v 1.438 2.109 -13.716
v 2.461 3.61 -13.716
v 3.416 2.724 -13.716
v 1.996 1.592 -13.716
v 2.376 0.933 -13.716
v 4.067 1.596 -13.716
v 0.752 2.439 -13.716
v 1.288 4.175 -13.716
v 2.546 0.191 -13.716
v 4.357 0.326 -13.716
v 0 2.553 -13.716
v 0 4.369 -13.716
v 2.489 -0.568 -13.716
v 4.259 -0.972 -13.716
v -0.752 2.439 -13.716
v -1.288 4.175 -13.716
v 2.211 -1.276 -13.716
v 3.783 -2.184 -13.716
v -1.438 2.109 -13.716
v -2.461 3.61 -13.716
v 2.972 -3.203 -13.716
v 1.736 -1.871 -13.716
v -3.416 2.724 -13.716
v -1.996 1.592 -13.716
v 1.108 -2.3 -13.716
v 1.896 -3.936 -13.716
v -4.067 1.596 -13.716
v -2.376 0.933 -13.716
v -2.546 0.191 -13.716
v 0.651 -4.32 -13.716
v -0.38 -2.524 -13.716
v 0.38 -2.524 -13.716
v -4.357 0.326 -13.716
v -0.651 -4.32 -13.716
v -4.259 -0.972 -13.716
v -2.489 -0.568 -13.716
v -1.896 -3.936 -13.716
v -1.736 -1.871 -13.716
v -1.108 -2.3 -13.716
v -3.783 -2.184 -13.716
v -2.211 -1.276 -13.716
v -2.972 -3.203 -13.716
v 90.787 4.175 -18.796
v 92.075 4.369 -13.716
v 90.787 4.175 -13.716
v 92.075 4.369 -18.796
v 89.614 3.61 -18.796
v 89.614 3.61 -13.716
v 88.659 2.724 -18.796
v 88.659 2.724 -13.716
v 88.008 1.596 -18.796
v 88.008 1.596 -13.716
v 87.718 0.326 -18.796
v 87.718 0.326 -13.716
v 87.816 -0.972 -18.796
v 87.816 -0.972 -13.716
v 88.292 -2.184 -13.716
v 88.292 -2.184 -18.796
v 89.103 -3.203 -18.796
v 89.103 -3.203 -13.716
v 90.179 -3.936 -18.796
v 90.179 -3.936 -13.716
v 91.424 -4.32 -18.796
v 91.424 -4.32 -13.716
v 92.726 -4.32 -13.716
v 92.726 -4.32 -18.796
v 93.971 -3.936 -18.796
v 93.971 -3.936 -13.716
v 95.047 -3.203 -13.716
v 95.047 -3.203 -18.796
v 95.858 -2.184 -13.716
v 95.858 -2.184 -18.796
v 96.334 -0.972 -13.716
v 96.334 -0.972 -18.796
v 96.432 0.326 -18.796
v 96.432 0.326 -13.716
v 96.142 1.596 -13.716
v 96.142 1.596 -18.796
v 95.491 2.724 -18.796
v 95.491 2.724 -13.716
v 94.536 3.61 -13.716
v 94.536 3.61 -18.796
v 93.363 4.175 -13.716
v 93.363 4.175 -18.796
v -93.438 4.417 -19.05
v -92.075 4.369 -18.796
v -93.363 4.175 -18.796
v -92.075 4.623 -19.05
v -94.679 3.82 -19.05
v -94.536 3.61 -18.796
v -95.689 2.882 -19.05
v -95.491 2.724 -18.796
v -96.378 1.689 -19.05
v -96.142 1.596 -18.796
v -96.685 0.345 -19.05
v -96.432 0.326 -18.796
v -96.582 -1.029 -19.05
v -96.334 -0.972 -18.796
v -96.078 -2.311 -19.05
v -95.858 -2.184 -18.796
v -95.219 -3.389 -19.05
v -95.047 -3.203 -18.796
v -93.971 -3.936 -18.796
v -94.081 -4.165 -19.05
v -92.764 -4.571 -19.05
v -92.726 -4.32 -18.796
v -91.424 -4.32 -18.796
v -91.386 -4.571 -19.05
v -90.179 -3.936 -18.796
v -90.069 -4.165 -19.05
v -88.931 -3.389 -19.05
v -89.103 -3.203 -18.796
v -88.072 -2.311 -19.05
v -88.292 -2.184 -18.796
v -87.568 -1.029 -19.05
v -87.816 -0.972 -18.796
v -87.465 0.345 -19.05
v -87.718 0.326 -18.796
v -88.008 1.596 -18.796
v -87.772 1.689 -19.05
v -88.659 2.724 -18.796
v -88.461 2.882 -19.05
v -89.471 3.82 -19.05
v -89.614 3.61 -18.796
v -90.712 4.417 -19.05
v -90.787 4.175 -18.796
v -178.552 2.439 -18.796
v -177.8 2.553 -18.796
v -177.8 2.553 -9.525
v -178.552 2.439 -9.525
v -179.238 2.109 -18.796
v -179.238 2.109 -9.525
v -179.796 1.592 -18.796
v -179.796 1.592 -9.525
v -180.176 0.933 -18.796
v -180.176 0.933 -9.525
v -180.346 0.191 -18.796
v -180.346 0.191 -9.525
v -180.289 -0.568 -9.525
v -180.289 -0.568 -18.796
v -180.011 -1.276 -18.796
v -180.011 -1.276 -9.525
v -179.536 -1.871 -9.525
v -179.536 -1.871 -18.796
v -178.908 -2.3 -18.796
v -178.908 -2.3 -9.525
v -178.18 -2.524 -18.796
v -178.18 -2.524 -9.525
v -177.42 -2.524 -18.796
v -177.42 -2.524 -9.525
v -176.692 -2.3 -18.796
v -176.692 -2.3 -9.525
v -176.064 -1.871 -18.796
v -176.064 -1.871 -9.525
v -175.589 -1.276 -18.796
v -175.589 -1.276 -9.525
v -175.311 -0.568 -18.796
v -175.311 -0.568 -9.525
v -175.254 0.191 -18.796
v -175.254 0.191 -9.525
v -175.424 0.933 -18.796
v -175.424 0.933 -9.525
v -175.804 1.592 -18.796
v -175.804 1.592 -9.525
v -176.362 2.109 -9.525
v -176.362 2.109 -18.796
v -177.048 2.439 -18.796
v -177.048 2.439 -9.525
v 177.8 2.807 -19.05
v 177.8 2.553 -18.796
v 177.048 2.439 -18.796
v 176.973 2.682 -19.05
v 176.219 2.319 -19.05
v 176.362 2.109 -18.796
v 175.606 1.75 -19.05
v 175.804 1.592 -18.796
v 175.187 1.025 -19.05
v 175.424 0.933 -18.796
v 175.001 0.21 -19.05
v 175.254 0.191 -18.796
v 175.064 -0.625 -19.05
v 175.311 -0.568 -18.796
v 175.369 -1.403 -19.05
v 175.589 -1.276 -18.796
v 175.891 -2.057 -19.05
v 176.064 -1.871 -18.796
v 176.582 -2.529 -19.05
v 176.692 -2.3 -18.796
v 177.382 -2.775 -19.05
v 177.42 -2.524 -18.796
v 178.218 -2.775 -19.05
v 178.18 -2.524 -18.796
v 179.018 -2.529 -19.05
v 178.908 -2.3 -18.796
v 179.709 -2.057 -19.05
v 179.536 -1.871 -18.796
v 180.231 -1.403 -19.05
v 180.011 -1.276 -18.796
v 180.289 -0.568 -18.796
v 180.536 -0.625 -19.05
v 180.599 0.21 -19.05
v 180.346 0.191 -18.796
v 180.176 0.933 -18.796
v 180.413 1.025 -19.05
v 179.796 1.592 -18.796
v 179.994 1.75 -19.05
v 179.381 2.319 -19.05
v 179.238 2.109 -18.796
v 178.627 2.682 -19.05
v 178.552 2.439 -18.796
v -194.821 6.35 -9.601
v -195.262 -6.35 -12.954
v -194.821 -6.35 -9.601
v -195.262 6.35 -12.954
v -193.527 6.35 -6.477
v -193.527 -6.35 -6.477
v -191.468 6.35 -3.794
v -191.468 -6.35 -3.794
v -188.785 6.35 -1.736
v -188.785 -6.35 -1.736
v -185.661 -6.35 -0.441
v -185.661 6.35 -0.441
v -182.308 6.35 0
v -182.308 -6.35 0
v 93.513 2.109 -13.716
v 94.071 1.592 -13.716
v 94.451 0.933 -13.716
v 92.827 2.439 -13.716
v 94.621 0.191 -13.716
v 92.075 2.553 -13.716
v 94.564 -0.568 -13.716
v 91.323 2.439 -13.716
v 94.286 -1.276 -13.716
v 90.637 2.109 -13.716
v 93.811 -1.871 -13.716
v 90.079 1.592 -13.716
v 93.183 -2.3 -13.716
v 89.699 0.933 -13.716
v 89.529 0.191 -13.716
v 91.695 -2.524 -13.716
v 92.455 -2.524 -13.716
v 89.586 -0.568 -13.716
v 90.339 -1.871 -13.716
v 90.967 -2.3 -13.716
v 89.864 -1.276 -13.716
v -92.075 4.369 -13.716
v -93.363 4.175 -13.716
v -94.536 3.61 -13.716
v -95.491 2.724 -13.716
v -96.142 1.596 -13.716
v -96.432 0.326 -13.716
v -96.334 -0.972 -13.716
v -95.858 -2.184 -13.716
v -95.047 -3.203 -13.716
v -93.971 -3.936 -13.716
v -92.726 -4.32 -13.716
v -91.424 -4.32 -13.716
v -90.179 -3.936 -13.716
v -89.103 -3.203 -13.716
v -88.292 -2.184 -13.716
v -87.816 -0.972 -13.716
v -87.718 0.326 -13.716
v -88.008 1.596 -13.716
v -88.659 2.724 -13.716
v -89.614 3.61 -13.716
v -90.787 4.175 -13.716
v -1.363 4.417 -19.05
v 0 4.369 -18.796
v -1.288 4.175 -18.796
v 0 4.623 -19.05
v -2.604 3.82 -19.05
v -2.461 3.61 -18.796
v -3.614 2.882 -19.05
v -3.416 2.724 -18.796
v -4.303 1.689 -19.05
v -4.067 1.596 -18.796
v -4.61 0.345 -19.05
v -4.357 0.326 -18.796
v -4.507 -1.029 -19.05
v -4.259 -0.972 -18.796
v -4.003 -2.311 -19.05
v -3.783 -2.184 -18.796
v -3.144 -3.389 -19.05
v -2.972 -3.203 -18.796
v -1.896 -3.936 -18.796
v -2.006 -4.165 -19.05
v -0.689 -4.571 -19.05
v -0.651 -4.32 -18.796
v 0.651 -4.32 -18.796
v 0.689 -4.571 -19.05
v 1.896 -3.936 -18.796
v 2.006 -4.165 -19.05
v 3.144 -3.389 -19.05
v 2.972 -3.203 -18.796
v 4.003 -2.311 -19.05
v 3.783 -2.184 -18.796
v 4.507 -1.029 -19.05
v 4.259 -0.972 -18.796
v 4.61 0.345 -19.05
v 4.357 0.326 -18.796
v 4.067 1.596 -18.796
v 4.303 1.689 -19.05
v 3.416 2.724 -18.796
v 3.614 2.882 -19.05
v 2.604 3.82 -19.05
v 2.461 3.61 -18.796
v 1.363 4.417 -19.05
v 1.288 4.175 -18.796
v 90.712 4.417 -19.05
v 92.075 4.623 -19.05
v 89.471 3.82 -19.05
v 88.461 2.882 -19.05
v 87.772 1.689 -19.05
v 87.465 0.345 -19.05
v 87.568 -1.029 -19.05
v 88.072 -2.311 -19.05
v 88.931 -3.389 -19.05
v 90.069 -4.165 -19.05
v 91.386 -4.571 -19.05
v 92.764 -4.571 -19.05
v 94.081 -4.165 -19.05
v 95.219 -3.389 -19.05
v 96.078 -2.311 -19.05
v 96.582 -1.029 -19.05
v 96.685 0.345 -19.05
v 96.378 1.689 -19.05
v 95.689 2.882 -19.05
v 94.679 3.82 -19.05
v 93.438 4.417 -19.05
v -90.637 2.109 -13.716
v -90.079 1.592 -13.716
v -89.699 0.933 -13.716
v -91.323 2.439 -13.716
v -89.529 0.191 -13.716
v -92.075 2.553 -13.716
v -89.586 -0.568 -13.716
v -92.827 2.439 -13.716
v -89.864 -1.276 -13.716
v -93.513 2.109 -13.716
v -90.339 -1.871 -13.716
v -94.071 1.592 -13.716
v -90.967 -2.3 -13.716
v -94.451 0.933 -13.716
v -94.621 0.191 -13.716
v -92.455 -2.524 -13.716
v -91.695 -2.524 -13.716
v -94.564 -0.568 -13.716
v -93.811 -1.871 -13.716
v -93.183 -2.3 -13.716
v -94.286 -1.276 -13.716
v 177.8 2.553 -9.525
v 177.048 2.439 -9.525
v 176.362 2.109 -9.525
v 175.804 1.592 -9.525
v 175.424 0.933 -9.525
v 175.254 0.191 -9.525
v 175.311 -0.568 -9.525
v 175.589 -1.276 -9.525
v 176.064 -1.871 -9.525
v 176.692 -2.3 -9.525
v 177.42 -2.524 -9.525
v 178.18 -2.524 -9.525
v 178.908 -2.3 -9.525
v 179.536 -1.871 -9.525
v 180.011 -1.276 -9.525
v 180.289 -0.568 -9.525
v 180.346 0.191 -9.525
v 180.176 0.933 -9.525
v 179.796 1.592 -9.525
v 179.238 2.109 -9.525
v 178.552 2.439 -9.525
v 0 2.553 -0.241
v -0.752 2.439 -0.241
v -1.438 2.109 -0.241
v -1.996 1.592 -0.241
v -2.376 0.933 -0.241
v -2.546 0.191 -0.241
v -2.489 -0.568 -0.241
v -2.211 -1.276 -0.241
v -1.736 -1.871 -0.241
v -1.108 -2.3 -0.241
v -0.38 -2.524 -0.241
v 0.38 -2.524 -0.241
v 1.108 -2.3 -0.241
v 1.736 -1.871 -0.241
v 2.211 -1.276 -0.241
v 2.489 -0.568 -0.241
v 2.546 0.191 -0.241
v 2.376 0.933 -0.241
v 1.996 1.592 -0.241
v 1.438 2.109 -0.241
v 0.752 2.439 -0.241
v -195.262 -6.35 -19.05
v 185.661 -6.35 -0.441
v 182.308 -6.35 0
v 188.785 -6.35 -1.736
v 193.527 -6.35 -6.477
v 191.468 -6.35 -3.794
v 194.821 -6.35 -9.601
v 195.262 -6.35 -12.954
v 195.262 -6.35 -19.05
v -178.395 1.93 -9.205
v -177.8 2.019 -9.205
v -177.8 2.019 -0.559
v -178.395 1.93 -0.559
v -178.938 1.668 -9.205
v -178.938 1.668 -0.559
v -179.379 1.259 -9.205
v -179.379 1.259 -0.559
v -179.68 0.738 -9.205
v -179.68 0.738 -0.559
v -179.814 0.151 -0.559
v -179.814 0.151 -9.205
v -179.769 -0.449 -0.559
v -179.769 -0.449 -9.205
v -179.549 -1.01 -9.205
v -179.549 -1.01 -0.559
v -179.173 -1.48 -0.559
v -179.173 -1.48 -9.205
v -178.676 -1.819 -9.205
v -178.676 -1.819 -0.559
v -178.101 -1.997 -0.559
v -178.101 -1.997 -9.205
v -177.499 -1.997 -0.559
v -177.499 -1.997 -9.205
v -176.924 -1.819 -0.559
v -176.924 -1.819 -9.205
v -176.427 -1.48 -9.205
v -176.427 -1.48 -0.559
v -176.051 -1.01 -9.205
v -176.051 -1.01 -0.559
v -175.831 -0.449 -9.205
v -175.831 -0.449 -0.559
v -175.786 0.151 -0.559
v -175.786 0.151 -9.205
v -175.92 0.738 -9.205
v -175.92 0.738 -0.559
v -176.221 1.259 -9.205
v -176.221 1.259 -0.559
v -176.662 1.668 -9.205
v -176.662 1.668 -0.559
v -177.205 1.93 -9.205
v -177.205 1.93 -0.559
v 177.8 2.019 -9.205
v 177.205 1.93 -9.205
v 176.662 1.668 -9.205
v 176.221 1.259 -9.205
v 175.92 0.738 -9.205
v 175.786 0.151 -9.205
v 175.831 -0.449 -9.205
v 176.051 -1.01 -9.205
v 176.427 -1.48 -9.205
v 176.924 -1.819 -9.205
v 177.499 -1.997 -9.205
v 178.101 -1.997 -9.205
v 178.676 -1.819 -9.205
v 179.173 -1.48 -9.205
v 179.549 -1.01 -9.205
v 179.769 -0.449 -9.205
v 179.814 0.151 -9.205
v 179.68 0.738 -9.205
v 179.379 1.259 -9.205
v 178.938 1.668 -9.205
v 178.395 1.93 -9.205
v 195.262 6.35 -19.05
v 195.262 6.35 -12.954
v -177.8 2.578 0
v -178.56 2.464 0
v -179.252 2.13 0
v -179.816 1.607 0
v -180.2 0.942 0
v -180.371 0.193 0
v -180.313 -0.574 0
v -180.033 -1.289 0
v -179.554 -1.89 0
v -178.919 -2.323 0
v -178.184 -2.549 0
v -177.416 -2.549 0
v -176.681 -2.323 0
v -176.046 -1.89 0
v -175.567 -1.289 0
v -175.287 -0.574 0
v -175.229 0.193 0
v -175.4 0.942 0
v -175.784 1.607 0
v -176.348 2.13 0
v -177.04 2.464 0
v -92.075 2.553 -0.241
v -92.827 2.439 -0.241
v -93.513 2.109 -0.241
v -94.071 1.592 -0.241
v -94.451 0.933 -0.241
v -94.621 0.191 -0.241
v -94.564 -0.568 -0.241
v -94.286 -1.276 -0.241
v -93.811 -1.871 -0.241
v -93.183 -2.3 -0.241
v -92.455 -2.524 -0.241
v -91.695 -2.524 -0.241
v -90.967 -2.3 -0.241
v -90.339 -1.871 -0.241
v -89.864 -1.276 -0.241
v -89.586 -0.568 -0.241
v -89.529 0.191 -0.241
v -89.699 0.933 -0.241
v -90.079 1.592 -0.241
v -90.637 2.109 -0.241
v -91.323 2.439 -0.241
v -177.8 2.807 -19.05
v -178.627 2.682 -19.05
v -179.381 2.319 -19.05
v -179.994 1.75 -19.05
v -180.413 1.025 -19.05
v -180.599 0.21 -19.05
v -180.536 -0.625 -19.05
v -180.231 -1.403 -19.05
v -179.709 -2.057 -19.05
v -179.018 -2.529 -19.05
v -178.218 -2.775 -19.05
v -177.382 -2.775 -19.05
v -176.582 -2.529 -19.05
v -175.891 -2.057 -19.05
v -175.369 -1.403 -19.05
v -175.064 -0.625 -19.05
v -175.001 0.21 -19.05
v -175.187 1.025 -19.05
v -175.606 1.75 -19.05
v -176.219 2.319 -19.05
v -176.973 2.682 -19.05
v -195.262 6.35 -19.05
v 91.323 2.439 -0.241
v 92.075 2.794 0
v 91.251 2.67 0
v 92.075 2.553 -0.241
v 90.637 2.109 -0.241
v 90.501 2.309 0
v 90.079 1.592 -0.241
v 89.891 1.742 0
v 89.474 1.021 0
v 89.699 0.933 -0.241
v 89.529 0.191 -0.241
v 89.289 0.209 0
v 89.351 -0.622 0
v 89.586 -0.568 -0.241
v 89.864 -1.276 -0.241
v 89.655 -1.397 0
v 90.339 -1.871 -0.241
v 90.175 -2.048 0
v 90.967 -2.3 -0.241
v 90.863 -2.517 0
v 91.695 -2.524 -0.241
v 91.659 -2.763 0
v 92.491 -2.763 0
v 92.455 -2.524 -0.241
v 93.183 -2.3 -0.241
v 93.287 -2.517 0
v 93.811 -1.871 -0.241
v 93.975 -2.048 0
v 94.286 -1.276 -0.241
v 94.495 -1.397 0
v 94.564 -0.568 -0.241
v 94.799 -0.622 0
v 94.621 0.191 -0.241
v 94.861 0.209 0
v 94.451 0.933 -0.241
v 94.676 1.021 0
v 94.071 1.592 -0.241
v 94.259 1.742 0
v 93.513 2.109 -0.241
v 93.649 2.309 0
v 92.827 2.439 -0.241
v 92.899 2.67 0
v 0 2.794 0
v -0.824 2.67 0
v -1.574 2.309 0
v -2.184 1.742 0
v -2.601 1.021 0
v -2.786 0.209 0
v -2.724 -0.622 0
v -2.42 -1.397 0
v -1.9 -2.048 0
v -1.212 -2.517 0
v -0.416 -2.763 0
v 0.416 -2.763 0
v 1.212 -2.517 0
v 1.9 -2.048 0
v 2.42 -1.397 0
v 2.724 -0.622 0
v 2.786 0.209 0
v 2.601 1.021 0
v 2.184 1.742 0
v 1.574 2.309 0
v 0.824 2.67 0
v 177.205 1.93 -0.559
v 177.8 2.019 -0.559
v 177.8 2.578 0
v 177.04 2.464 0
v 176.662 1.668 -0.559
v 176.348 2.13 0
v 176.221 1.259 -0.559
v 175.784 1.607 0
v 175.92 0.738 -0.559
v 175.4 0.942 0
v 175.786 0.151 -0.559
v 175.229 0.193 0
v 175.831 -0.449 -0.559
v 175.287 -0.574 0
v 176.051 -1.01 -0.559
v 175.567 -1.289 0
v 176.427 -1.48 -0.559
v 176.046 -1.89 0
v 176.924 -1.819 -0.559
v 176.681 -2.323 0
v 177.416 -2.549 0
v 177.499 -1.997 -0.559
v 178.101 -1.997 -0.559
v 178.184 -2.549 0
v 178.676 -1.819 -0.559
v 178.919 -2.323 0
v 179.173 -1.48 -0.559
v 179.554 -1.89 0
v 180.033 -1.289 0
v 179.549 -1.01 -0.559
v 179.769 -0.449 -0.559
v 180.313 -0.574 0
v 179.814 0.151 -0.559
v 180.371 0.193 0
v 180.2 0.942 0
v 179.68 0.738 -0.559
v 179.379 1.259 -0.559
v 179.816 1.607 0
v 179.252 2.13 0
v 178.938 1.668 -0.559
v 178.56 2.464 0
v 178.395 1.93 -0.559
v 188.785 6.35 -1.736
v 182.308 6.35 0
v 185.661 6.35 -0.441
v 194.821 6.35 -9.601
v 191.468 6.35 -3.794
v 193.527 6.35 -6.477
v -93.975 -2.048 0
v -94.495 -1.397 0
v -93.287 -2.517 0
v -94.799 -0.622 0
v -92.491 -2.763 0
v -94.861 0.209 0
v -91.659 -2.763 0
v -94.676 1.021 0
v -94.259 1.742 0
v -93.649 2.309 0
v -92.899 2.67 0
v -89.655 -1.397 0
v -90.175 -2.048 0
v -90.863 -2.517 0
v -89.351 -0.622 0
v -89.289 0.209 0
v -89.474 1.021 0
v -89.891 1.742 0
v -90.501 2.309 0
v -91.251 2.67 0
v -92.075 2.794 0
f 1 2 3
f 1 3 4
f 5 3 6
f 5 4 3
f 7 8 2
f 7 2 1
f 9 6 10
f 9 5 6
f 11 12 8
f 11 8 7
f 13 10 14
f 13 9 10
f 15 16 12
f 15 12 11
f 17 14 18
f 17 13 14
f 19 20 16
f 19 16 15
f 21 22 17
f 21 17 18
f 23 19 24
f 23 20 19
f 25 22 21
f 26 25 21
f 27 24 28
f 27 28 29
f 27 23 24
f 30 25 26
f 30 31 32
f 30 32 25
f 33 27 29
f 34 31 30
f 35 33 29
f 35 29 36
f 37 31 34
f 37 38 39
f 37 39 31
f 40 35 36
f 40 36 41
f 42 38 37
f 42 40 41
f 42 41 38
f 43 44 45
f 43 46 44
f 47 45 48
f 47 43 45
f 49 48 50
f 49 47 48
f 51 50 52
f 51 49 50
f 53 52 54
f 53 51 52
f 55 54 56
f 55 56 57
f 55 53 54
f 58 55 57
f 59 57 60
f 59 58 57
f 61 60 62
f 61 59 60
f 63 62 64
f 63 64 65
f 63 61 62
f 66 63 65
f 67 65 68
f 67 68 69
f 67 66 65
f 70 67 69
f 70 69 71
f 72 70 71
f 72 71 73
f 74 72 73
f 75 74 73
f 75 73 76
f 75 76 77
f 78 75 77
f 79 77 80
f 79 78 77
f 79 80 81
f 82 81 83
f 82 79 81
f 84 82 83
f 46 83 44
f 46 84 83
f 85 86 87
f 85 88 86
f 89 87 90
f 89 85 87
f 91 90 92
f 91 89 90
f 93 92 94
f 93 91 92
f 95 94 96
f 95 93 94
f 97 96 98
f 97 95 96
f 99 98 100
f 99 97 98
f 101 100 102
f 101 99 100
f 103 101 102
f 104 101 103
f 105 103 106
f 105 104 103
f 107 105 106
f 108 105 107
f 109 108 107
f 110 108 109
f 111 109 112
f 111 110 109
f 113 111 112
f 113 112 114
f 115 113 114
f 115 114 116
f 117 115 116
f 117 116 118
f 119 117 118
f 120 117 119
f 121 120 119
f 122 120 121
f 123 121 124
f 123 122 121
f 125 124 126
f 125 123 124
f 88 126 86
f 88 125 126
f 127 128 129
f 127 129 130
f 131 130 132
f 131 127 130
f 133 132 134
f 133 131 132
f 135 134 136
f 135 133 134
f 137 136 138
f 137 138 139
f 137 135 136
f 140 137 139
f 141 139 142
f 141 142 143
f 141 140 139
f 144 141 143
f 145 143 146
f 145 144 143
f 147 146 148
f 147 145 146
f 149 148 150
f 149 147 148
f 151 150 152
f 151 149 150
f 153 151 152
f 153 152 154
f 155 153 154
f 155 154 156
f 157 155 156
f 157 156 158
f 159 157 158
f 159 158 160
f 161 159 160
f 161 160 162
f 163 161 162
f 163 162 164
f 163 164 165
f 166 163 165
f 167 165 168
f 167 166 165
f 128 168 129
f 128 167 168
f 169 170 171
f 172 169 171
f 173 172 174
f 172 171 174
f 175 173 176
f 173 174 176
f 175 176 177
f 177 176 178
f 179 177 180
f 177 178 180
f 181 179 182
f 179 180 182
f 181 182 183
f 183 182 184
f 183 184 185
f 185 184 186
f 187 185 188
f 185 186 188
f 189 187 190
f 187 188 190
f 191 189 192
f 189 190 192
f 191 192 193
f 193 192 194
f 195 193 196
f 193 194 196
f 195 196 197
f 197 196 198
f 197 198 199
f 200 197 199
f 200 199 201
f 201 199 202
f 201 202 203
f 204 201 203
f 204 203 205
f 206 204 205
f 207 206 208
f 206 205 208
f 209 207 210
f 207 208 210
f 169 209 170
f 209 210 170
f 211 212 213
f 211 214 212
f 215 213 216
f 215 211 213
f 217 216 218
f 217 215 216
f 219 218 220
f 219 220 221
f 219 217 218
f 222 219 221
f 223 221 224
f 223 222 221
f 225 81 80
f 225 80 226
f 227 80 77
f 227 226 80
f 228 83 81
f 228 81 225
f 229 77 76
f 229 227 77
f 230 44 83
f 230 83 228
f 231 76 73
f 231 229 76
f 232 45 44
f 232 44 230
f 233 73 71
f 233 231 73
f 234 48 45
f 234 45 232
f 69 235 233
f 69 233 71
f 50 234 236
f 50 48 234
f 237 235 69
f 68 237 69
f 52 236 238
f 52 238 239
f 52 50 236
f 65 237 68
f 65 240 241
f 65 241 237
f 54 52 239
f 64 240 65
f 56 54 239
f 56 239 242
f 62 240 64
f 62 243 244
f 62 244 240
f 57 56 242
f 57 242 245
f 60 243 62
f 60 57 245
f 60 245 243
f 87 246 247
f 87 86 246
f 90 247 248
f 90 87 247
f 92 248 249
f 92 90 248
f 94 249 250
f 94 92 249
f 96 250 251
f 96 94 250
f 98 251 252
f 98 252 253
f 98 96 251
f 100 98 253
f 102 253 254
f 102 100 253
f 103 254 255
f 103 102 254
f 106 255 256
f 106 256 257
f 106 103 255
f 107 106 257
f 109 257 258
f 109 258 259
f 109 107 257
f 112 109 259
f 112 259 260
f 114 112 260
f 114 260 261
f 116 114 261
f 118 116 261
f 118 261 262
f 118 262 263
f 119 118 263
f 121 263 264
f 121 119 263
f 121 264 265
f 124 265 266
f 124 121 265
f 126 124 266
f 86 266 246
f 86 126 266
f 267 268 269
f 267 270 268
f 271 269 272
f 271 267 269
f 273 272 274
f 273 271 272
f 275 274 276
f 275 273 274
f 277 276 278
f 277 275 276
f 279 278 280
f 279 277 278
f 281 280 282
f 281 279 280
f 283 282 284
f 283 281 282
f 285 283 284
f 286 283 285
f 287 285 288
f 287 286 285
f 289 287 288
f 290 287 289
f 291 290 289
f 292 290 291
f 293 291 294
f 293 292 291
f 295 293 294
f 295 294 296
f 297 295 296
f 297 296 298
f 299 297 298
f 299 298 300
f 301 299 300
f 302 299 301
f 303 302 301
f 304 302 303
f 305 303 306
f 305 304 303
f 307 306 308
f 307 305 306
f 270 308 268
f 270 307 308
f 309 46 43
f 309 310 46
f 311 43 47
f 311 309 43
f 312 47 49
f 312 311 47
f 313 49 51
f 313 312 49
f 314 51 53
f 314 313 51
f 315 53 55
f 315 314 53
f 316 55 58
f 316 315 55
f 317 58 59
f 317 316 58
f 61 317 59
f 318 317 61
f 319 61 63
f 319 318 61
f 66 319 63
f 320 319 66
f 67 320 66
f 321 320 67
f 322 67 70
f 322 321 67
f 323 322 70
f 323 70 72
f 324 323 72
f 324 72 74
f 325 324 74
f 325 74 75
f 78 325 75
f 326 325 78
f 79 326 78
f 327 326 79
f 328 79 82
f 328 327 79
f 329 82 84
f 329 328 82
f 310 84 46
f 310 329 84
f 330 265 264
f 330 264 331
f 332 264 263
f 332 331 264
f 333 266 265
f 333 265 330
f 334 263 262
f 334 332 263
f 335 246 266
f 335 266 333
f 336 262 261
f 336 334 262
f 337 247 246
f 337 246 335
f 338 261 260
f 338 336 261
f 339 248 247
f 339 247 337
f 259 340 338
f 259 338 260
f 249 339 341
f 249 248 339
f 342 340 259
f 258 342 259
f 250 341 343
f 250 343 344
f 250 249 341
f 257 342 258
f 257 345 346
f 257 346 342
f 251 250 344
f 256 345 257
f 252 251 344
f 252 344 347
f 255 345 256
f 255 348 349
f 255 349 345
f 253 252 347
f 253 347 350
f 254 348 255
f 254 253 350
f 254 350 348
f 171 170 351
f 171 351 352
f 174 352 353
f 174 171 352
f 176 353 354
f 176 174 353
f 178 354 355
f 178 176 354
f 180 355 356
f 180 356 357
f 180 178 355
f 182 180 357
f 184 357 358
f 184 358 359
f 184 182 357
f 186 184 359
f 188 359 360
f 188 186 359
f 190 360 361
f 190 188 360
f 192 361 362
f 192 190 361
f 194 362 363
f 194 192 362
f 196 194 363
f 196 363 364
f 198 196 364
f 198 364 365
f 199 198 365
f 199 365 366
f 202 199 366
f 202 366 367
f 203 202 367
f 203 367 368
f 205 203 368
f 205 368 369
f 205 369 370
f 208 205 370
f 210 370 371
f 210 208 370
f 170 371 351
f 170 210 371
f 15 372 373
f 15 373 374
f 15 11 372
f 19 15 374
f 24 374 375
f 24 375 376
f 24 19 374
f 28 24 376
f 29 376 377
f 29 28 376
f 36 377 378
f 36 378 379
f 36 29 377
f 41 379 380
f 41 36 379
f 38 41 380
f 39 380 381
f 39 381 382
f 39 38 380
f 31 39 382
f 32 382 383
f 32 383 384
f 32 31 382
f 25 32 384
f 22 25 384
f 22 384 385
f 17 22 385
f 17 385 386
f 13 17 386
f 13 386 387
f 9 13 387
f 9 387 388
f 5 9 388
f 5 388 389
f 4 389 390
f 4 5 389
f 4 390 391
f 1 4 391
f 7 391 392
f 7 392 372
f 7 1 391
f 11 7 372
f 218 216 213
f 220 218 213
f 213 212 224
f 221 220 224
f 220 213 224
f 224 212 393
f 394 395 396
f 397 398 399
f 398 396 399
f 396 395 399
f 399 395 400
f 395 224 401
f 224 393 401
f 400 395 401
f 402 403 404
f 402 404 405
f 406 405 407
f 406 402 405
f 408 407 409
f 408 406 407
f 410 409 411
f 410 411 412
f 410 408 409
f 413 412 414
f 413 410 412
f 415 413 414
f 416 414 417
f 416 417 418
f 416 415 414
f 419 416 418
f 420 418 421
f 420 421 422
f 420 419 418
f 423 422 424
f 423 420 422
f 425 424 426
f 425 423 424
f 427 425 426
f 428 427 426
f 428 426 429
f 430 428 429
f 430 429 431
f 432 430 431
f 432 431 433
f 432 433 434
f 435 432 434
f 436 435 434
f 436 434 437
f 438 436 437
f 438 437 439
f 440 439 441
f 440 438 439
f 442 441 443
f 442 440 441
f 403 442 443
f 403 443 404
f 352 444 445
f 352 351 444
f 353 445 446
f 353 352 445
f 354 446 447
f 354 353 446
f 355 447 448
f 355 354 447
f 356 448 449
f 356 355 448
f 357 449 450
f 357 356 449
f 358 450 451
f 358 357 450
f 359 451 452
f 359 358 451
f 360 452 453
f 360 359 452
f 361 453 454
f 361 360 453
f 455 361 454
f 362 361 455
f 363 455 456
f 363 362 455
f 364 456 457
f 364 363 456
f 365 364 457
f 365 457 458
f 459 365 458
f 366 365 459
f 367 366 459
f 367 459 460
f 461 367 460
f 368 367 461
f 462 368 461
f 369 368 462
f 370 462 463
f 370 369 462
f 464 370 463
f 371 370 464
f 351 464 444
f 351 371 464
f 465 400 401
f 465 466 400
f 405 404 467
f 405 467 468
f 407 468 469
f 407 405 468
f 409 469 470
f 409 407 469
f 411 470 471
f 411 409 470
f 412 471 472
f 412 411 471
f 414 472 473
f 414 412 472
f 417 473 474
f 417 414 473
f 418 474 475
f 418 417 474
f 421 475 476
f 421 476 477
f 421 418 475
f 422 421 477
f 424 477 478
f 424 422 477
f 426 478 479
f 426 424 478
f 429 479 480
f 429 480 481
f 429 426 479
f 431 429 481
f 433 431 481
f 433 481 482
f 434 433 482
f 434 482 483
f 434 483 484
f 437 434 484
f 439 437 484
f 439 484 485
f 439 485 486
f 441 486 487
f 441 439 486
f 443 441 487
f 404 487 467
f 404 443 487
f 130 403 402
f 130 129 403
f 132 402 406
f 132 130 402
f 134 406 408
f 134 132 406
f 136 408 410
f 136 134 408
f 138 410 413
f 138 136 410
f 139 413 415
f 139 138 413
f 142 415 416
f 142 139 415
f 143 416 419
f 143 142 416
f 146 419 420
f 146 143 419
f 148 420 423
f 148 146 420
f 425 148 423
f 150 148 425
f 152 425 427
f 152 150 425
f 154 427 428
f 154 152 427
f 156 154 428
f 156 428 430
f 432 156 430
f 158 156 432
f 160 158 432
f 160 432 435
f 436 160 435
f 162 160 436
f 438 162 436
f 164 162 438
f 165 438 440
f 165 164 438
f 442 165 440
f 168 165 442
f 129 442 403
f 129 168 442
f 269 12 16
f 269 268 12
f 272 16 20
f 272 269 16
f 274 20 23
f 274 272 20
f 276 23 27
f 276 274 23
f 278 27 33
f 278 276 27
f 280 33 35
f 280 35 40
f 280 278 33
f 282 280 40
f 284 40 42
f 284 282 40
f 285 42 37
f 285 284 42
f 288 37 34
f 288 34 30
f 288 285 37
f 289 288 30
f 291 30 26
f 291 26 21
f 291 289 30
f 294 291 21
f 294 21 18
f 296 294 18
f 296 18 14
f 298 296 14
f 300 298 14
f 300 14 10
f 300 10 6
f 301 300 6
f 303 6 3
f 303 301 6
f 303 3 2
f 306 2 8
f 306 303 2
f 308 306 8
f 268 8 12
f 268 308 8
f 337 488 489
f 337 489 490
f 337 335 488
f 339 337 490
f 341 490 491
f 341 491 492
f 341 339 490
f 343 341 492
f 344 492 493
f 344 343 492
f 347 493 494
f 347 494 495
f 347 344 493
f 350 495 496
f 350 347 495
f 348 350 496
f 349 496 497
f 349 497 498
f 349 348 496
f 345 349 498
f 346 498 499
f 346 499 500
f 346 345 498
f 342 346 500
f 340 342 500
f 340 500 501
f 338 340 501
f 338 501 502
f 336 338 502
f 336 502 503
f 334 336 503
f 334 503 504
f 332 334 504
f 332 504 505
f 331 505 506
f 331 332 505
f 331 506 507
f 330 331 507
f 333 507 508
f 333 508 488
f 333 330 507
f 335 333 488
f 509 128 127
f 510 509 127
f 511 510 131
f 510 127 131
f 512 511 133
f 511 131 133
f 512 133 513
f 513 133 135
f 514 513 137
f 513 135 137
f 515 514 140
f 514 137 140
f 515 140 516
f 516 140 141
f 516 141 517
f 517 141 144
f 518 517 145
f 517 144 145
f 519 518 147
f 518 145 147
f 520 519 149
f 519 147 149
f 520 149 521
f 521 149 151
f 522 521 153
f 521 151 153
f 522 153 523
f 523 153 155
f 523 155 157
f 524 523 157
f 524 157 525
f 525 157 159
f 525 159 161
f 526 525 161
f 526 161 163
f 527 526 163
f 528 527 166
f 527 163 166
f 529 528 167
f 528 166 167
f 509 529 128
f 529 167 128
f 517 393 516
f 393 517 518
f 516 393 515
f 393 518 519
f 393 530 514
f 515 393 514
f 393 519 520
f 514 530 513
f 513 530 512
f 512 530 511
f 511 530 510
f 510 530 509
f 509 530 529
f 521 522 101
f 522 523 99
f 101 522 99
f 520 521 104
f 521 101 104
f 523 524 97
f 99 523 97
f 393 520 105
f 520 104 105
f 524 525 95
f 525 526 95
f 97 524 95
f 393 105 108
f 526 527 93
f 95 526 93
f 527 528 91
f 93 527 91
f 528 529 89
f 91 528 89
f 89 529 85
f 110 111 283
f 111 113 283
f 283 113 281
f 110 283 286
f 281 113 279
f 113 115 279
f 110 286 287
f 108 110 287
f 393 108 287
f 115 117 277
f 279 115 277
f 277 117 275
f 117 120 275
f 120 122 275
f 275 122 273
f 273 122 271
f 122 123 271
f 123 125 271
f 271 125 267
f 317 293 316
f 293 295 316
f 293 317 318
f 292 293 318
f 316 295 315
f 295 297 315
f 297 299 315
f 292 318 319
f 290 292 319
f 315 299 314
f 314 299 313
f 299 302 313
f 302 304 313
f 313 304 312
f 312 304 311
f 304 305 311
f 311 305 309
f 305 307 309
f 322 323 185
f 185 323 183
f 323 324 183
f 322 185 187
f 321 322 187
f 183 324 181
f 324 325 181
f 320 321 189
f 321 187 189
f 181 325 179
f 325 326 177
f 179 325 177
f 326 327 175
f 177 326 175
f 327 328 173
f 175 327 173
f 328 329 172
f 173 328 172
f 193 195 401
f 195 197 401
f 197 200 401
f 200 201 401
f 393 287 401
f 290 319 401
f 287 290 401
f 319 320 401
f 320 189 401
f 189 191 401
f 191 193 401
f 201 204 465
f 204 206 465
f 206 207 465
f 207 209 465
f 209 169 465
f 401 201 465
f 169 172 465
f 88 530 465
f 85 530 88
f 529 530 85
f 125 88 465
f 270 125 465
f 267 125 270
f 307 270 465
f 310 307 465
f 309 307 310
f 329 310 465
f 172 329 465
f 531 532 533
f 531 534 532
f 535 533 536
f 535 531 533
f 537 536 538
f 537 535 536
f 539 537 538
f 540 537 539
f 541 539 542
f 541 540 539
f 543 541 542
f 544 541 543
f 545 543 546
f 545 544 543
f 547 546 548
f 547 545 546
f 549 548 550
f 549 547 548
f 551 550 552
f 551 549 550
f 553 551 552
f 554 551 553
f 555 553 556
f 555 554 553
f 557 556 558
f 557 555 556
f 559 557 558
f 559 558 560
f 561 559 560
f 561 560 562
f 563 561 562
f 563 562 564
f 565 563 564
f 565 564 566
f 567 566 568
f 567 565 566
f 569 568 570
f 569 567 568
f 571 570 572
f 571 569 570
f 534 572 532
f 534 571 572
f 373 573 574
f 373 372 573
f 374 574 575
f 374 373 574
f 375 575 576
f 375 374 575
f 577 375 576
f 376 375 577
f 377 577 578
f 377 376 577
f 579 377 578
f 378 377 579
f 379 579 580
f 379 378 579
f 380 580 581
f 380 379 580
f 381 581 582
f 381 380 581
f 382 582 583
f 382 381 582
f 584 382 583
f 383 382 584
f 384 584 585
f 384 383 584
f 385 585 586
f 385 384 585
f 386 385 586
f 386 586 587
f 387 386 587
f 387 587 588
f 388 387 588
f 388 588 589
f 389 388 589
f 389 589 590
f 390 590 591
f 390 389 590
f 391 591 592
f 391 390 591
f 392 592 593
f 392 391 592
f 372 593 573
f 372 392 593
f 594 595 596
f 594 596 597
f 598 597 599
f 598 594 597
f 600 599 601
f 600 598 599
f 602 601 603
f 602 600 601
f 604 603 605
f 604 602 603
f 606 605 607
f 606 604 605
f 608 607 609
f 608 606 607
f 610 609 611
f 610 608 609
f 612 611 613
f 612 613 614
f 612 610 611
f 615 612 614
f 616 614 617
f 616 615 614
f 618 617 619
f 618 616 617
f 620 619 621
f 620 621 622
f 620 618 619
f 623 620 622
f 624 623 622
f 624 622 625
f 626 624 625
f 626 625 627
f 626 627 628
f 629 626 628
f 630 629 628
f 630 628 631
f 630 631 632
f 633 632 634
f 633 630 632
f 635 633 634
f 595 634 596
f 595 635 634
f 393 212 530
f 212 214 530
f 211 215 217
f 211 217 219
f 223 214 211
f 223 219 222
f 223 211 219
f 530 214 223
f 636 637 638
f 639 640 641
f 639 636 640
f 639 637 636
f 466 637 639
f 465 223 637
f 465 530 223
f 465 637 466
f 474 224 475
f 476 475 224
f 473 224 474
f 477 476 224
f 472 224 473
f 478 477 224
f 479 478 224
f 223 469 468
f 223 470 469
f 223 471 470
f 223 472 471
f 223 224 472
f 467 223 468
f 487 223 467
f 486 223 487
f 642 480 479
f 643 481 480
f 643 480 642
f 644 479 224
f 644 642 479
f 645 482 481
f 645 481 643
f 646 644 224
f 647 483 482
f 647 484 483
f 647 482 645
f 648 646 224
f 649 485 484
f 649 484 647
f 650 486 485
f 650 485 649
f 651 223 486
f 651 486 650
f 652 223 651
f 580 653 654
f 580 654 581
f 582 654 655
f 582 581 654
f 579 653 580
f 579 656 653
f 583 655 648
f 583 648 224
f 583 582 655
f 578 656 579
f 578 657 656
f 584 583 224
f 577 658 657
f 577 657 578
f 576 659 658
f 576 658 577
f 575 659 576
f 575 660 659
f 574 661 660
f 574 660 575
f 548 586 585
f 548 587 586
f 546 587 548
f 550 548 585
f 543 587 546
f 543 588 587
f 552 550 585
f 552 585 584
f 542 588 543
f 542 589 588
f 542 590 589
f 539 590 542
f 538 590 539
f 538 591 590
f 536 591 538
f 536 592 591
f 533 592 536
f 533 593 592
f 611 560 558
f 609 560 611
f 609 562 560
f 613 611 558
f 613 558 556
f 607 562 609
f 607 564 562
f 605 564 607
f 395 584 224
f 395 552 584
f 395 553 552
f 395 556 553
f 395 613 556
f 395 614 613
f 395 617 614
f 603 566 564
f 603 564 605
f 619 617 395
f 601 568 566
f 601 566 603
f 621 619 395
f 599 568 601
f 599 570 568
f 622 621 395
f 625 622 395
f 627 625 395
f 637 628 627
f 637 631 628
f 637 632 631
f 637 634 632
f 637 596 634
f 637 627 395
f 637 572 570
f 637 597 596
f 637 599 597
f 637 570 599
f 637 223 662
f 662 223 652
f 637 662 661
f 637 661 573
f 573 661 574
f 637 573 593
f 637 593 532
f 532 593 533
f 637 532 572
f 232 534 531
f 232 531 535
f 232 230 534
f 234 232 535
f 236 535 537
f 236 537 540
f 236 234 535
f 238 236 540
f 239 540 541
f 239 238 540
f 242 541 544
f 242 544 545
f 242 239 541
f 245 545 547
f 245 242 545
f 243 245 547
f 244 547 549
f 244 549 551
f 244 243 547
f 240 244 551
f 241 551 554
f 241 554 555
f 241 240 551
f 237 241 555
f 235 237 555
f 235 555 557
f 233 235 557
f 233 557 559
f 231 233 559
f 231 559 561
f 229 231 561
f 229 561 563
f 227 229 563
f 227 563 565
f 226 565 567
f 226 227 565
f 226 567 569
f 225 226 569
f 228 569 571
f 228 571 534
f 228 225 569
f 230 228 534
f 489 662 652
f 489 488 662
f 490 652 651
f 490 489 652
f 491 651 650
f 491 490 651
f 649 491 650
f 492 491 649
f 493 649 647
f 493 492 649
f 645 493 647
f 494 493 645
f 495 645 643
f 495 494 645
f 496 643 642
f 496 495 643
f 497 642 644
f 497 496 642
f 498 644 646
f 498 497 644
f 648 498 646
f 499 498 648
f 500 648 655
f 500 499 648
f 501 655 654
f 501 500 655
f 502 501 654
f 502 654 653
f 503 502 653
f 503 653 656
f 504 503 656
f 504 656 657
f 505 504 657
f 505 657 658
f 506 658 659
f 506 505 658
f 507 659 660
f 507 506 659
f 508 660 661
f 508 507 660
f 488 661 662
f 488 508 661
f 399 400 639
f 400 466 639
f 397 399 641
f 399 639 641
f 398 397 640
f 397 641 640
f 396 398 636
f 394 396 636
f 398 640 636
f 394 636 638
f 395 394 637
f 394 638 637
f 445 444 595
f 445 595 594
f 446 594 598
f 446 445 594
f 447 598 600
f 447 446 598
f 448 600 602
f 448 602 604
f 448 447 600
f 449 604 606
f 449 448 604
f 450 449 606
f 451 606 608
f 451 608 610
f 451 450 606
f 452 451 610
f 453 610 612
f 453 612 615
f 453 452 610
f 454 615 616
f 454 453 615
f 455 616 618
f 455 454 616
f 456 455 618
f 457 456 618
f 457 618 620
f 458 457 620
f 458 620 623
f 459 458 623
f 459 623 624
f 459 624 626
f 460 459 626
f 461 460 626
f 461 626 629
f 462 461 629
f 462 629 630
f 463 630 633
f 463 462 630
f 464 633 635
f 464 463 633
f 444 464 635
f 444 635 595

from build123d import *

# Parameters (mm, degrees)
SKETCH1_W                                    = 390.525
SKETCH1_H                                    = 19.05
EXTRUDE1_DEPTH                               = 6.35
FILLET1_R                                    = 12.954
COUNTERDRILLED_10_32_AT_2_COUNT              = 2
COUNTERDRILLED_10_32_AT_2_PITCH              = 355.6
CBORE_FOR_10_SOCKET_HEAD_CAP_SCREW1_AT_COUNT = 2
CBORE_FOR_10_SOCKET_HEAD_CAP_SCREW1_AT_PITCH = 92.075
CBORE_FOR_10_SOCKET_HEAD_CAP_SCREW1_2_COUNT  = 2
CBORE_FOR_10_SOCKET_HEAD_CAP_SCREW1_2_PITCH  = 184.15
CHAMFER1_SIZE                                = 0.254
CHAMFER2_SIZE                                = 0.5588


with BuildPart() as part:
    # Sketch1 → Extrude1 (new, symmetric)
    with BuildSketch(Plane(origin=(0, 0, 0), x_dir=(1, 0, 0), z_dir=(0, 1, 0))):
        with Locations((0, 9.525)):
            Rectangle(SKETCH1_W, SKETCH1_H)
    extrude(amount=EXTRUDE1_DEPTH, both=True)

    # Fillet1
    fillet1_edges = [part.edges().sort_by_distance(p)[0] for p in [
        (195.2625, 0, 0),
        (-195.2625, 0, 0),
    ]]
    fillet(fillet1_edges, radius=FILLET1_R)

    # Sketch3 → counterdrilled 10-32 (revolve, cut)
    with BuildSketch(Plane(origin=(177.8, 0, -19.05), x_dir=(0, 1, 0), z_dir=(1, 0, 0))):
        Polygon((0, 0), (0, 19.05), (2.0193, 19.05), (2.0193, 9.845499054), (2.5527, 9.525), (2.5527, 0), align=None)
    counterdrilled_10_32 = revolve(axis=Axis((177.8, 0, -25.180023899), (0, 0, 1)), mode=Mode.SUBTRACT)

    # counterdrilled 10-32 at 2: counterdrilled 10-32 ×2
    with Locations(*[(-i * COUNTERDRILLED_10_32_AT_2_PITCH, 0, 0) for i in range(1, COUNTERDRILLED_10_32_AT_2_COUNT)]):
        add(counterdrilled_10_32, mode=Mode.SUBTRACT)

    # Sketch5 → CBORE for #10 Socket Head Cap Screw1 (revolve, cut)
    with BuildSketch(Plane(origin=(92.075, 0, -19.05), x_dir=(0, 1, 0), z_dir=(1, 0, 0))):
        Polygon((0, 0), (0, 19.05), (2.794, 19.05), (2.5527, 18.8087), (2.5527, 5.334), (4.3688, 5.334), (4.3688, 0.254), (4.6228, 0), align=None)
    cbore_for_10_socket_head_cap_screw1 = revolve(axis=Axis((92.075, 0, -25.4), (0, 0, 1)), mode=Mode.SUBTRACT)

    # CBORE for #10 Socket Head Cap Screw1 at: CBORE for #10 Socket Head Cap Screw1 ×2
    with Locations(*[(-i * CBORE_FOR_10_SOCKET_HEAD_CAP_SCREW1_AT_PITCH, 0, 0) for i in range(1, CBORE_FOR_10_SOCKET_HEAD_CAP_SCREW1_AT_COUNT)]):
        add(cbore_for_10_socket_head_cap_screw1, mode=Mode.SUBTRACT)

    # CBORE for _10 Socket Head Cap Screw1 2: CBORE for #10 Socket Head Cap Screw1 ×2
    with Locations(*[(-i * CBORE_FOR_10_SOCKET_HEAD_CAP_SCREW1_2_PITCH, 0, 0) for i in range(1, CBORE_FOR_10_SOCKET_HEAD_CAP_SCREW1_2_COUNT)]):
        add(cbore_for_10_socket_head_cap_screw1, mode=Mode.SUBTRACT)

    # Chamfer1
    chamfer1_edges = [part.edges().sort_by_distance(p)[0] for p in [
        (-177.8, -2.5527, -19.05),
        (177.8, -2.5527, -19.05),
    ]]
    chamfer(chamfer1_edges, length=CHAMFER1_SIZE)

    # Chamfer2
    chamfer2_edges = [part.edges().sort_by_distance(p)[0] for p in [
        (-177.8, -2.0193, 0),
        (177.8, -2.0193, 0),
    ]]
    chamfer(chamfer2_edges, length=CHAMFER2_SIZE)


solid = part.part
